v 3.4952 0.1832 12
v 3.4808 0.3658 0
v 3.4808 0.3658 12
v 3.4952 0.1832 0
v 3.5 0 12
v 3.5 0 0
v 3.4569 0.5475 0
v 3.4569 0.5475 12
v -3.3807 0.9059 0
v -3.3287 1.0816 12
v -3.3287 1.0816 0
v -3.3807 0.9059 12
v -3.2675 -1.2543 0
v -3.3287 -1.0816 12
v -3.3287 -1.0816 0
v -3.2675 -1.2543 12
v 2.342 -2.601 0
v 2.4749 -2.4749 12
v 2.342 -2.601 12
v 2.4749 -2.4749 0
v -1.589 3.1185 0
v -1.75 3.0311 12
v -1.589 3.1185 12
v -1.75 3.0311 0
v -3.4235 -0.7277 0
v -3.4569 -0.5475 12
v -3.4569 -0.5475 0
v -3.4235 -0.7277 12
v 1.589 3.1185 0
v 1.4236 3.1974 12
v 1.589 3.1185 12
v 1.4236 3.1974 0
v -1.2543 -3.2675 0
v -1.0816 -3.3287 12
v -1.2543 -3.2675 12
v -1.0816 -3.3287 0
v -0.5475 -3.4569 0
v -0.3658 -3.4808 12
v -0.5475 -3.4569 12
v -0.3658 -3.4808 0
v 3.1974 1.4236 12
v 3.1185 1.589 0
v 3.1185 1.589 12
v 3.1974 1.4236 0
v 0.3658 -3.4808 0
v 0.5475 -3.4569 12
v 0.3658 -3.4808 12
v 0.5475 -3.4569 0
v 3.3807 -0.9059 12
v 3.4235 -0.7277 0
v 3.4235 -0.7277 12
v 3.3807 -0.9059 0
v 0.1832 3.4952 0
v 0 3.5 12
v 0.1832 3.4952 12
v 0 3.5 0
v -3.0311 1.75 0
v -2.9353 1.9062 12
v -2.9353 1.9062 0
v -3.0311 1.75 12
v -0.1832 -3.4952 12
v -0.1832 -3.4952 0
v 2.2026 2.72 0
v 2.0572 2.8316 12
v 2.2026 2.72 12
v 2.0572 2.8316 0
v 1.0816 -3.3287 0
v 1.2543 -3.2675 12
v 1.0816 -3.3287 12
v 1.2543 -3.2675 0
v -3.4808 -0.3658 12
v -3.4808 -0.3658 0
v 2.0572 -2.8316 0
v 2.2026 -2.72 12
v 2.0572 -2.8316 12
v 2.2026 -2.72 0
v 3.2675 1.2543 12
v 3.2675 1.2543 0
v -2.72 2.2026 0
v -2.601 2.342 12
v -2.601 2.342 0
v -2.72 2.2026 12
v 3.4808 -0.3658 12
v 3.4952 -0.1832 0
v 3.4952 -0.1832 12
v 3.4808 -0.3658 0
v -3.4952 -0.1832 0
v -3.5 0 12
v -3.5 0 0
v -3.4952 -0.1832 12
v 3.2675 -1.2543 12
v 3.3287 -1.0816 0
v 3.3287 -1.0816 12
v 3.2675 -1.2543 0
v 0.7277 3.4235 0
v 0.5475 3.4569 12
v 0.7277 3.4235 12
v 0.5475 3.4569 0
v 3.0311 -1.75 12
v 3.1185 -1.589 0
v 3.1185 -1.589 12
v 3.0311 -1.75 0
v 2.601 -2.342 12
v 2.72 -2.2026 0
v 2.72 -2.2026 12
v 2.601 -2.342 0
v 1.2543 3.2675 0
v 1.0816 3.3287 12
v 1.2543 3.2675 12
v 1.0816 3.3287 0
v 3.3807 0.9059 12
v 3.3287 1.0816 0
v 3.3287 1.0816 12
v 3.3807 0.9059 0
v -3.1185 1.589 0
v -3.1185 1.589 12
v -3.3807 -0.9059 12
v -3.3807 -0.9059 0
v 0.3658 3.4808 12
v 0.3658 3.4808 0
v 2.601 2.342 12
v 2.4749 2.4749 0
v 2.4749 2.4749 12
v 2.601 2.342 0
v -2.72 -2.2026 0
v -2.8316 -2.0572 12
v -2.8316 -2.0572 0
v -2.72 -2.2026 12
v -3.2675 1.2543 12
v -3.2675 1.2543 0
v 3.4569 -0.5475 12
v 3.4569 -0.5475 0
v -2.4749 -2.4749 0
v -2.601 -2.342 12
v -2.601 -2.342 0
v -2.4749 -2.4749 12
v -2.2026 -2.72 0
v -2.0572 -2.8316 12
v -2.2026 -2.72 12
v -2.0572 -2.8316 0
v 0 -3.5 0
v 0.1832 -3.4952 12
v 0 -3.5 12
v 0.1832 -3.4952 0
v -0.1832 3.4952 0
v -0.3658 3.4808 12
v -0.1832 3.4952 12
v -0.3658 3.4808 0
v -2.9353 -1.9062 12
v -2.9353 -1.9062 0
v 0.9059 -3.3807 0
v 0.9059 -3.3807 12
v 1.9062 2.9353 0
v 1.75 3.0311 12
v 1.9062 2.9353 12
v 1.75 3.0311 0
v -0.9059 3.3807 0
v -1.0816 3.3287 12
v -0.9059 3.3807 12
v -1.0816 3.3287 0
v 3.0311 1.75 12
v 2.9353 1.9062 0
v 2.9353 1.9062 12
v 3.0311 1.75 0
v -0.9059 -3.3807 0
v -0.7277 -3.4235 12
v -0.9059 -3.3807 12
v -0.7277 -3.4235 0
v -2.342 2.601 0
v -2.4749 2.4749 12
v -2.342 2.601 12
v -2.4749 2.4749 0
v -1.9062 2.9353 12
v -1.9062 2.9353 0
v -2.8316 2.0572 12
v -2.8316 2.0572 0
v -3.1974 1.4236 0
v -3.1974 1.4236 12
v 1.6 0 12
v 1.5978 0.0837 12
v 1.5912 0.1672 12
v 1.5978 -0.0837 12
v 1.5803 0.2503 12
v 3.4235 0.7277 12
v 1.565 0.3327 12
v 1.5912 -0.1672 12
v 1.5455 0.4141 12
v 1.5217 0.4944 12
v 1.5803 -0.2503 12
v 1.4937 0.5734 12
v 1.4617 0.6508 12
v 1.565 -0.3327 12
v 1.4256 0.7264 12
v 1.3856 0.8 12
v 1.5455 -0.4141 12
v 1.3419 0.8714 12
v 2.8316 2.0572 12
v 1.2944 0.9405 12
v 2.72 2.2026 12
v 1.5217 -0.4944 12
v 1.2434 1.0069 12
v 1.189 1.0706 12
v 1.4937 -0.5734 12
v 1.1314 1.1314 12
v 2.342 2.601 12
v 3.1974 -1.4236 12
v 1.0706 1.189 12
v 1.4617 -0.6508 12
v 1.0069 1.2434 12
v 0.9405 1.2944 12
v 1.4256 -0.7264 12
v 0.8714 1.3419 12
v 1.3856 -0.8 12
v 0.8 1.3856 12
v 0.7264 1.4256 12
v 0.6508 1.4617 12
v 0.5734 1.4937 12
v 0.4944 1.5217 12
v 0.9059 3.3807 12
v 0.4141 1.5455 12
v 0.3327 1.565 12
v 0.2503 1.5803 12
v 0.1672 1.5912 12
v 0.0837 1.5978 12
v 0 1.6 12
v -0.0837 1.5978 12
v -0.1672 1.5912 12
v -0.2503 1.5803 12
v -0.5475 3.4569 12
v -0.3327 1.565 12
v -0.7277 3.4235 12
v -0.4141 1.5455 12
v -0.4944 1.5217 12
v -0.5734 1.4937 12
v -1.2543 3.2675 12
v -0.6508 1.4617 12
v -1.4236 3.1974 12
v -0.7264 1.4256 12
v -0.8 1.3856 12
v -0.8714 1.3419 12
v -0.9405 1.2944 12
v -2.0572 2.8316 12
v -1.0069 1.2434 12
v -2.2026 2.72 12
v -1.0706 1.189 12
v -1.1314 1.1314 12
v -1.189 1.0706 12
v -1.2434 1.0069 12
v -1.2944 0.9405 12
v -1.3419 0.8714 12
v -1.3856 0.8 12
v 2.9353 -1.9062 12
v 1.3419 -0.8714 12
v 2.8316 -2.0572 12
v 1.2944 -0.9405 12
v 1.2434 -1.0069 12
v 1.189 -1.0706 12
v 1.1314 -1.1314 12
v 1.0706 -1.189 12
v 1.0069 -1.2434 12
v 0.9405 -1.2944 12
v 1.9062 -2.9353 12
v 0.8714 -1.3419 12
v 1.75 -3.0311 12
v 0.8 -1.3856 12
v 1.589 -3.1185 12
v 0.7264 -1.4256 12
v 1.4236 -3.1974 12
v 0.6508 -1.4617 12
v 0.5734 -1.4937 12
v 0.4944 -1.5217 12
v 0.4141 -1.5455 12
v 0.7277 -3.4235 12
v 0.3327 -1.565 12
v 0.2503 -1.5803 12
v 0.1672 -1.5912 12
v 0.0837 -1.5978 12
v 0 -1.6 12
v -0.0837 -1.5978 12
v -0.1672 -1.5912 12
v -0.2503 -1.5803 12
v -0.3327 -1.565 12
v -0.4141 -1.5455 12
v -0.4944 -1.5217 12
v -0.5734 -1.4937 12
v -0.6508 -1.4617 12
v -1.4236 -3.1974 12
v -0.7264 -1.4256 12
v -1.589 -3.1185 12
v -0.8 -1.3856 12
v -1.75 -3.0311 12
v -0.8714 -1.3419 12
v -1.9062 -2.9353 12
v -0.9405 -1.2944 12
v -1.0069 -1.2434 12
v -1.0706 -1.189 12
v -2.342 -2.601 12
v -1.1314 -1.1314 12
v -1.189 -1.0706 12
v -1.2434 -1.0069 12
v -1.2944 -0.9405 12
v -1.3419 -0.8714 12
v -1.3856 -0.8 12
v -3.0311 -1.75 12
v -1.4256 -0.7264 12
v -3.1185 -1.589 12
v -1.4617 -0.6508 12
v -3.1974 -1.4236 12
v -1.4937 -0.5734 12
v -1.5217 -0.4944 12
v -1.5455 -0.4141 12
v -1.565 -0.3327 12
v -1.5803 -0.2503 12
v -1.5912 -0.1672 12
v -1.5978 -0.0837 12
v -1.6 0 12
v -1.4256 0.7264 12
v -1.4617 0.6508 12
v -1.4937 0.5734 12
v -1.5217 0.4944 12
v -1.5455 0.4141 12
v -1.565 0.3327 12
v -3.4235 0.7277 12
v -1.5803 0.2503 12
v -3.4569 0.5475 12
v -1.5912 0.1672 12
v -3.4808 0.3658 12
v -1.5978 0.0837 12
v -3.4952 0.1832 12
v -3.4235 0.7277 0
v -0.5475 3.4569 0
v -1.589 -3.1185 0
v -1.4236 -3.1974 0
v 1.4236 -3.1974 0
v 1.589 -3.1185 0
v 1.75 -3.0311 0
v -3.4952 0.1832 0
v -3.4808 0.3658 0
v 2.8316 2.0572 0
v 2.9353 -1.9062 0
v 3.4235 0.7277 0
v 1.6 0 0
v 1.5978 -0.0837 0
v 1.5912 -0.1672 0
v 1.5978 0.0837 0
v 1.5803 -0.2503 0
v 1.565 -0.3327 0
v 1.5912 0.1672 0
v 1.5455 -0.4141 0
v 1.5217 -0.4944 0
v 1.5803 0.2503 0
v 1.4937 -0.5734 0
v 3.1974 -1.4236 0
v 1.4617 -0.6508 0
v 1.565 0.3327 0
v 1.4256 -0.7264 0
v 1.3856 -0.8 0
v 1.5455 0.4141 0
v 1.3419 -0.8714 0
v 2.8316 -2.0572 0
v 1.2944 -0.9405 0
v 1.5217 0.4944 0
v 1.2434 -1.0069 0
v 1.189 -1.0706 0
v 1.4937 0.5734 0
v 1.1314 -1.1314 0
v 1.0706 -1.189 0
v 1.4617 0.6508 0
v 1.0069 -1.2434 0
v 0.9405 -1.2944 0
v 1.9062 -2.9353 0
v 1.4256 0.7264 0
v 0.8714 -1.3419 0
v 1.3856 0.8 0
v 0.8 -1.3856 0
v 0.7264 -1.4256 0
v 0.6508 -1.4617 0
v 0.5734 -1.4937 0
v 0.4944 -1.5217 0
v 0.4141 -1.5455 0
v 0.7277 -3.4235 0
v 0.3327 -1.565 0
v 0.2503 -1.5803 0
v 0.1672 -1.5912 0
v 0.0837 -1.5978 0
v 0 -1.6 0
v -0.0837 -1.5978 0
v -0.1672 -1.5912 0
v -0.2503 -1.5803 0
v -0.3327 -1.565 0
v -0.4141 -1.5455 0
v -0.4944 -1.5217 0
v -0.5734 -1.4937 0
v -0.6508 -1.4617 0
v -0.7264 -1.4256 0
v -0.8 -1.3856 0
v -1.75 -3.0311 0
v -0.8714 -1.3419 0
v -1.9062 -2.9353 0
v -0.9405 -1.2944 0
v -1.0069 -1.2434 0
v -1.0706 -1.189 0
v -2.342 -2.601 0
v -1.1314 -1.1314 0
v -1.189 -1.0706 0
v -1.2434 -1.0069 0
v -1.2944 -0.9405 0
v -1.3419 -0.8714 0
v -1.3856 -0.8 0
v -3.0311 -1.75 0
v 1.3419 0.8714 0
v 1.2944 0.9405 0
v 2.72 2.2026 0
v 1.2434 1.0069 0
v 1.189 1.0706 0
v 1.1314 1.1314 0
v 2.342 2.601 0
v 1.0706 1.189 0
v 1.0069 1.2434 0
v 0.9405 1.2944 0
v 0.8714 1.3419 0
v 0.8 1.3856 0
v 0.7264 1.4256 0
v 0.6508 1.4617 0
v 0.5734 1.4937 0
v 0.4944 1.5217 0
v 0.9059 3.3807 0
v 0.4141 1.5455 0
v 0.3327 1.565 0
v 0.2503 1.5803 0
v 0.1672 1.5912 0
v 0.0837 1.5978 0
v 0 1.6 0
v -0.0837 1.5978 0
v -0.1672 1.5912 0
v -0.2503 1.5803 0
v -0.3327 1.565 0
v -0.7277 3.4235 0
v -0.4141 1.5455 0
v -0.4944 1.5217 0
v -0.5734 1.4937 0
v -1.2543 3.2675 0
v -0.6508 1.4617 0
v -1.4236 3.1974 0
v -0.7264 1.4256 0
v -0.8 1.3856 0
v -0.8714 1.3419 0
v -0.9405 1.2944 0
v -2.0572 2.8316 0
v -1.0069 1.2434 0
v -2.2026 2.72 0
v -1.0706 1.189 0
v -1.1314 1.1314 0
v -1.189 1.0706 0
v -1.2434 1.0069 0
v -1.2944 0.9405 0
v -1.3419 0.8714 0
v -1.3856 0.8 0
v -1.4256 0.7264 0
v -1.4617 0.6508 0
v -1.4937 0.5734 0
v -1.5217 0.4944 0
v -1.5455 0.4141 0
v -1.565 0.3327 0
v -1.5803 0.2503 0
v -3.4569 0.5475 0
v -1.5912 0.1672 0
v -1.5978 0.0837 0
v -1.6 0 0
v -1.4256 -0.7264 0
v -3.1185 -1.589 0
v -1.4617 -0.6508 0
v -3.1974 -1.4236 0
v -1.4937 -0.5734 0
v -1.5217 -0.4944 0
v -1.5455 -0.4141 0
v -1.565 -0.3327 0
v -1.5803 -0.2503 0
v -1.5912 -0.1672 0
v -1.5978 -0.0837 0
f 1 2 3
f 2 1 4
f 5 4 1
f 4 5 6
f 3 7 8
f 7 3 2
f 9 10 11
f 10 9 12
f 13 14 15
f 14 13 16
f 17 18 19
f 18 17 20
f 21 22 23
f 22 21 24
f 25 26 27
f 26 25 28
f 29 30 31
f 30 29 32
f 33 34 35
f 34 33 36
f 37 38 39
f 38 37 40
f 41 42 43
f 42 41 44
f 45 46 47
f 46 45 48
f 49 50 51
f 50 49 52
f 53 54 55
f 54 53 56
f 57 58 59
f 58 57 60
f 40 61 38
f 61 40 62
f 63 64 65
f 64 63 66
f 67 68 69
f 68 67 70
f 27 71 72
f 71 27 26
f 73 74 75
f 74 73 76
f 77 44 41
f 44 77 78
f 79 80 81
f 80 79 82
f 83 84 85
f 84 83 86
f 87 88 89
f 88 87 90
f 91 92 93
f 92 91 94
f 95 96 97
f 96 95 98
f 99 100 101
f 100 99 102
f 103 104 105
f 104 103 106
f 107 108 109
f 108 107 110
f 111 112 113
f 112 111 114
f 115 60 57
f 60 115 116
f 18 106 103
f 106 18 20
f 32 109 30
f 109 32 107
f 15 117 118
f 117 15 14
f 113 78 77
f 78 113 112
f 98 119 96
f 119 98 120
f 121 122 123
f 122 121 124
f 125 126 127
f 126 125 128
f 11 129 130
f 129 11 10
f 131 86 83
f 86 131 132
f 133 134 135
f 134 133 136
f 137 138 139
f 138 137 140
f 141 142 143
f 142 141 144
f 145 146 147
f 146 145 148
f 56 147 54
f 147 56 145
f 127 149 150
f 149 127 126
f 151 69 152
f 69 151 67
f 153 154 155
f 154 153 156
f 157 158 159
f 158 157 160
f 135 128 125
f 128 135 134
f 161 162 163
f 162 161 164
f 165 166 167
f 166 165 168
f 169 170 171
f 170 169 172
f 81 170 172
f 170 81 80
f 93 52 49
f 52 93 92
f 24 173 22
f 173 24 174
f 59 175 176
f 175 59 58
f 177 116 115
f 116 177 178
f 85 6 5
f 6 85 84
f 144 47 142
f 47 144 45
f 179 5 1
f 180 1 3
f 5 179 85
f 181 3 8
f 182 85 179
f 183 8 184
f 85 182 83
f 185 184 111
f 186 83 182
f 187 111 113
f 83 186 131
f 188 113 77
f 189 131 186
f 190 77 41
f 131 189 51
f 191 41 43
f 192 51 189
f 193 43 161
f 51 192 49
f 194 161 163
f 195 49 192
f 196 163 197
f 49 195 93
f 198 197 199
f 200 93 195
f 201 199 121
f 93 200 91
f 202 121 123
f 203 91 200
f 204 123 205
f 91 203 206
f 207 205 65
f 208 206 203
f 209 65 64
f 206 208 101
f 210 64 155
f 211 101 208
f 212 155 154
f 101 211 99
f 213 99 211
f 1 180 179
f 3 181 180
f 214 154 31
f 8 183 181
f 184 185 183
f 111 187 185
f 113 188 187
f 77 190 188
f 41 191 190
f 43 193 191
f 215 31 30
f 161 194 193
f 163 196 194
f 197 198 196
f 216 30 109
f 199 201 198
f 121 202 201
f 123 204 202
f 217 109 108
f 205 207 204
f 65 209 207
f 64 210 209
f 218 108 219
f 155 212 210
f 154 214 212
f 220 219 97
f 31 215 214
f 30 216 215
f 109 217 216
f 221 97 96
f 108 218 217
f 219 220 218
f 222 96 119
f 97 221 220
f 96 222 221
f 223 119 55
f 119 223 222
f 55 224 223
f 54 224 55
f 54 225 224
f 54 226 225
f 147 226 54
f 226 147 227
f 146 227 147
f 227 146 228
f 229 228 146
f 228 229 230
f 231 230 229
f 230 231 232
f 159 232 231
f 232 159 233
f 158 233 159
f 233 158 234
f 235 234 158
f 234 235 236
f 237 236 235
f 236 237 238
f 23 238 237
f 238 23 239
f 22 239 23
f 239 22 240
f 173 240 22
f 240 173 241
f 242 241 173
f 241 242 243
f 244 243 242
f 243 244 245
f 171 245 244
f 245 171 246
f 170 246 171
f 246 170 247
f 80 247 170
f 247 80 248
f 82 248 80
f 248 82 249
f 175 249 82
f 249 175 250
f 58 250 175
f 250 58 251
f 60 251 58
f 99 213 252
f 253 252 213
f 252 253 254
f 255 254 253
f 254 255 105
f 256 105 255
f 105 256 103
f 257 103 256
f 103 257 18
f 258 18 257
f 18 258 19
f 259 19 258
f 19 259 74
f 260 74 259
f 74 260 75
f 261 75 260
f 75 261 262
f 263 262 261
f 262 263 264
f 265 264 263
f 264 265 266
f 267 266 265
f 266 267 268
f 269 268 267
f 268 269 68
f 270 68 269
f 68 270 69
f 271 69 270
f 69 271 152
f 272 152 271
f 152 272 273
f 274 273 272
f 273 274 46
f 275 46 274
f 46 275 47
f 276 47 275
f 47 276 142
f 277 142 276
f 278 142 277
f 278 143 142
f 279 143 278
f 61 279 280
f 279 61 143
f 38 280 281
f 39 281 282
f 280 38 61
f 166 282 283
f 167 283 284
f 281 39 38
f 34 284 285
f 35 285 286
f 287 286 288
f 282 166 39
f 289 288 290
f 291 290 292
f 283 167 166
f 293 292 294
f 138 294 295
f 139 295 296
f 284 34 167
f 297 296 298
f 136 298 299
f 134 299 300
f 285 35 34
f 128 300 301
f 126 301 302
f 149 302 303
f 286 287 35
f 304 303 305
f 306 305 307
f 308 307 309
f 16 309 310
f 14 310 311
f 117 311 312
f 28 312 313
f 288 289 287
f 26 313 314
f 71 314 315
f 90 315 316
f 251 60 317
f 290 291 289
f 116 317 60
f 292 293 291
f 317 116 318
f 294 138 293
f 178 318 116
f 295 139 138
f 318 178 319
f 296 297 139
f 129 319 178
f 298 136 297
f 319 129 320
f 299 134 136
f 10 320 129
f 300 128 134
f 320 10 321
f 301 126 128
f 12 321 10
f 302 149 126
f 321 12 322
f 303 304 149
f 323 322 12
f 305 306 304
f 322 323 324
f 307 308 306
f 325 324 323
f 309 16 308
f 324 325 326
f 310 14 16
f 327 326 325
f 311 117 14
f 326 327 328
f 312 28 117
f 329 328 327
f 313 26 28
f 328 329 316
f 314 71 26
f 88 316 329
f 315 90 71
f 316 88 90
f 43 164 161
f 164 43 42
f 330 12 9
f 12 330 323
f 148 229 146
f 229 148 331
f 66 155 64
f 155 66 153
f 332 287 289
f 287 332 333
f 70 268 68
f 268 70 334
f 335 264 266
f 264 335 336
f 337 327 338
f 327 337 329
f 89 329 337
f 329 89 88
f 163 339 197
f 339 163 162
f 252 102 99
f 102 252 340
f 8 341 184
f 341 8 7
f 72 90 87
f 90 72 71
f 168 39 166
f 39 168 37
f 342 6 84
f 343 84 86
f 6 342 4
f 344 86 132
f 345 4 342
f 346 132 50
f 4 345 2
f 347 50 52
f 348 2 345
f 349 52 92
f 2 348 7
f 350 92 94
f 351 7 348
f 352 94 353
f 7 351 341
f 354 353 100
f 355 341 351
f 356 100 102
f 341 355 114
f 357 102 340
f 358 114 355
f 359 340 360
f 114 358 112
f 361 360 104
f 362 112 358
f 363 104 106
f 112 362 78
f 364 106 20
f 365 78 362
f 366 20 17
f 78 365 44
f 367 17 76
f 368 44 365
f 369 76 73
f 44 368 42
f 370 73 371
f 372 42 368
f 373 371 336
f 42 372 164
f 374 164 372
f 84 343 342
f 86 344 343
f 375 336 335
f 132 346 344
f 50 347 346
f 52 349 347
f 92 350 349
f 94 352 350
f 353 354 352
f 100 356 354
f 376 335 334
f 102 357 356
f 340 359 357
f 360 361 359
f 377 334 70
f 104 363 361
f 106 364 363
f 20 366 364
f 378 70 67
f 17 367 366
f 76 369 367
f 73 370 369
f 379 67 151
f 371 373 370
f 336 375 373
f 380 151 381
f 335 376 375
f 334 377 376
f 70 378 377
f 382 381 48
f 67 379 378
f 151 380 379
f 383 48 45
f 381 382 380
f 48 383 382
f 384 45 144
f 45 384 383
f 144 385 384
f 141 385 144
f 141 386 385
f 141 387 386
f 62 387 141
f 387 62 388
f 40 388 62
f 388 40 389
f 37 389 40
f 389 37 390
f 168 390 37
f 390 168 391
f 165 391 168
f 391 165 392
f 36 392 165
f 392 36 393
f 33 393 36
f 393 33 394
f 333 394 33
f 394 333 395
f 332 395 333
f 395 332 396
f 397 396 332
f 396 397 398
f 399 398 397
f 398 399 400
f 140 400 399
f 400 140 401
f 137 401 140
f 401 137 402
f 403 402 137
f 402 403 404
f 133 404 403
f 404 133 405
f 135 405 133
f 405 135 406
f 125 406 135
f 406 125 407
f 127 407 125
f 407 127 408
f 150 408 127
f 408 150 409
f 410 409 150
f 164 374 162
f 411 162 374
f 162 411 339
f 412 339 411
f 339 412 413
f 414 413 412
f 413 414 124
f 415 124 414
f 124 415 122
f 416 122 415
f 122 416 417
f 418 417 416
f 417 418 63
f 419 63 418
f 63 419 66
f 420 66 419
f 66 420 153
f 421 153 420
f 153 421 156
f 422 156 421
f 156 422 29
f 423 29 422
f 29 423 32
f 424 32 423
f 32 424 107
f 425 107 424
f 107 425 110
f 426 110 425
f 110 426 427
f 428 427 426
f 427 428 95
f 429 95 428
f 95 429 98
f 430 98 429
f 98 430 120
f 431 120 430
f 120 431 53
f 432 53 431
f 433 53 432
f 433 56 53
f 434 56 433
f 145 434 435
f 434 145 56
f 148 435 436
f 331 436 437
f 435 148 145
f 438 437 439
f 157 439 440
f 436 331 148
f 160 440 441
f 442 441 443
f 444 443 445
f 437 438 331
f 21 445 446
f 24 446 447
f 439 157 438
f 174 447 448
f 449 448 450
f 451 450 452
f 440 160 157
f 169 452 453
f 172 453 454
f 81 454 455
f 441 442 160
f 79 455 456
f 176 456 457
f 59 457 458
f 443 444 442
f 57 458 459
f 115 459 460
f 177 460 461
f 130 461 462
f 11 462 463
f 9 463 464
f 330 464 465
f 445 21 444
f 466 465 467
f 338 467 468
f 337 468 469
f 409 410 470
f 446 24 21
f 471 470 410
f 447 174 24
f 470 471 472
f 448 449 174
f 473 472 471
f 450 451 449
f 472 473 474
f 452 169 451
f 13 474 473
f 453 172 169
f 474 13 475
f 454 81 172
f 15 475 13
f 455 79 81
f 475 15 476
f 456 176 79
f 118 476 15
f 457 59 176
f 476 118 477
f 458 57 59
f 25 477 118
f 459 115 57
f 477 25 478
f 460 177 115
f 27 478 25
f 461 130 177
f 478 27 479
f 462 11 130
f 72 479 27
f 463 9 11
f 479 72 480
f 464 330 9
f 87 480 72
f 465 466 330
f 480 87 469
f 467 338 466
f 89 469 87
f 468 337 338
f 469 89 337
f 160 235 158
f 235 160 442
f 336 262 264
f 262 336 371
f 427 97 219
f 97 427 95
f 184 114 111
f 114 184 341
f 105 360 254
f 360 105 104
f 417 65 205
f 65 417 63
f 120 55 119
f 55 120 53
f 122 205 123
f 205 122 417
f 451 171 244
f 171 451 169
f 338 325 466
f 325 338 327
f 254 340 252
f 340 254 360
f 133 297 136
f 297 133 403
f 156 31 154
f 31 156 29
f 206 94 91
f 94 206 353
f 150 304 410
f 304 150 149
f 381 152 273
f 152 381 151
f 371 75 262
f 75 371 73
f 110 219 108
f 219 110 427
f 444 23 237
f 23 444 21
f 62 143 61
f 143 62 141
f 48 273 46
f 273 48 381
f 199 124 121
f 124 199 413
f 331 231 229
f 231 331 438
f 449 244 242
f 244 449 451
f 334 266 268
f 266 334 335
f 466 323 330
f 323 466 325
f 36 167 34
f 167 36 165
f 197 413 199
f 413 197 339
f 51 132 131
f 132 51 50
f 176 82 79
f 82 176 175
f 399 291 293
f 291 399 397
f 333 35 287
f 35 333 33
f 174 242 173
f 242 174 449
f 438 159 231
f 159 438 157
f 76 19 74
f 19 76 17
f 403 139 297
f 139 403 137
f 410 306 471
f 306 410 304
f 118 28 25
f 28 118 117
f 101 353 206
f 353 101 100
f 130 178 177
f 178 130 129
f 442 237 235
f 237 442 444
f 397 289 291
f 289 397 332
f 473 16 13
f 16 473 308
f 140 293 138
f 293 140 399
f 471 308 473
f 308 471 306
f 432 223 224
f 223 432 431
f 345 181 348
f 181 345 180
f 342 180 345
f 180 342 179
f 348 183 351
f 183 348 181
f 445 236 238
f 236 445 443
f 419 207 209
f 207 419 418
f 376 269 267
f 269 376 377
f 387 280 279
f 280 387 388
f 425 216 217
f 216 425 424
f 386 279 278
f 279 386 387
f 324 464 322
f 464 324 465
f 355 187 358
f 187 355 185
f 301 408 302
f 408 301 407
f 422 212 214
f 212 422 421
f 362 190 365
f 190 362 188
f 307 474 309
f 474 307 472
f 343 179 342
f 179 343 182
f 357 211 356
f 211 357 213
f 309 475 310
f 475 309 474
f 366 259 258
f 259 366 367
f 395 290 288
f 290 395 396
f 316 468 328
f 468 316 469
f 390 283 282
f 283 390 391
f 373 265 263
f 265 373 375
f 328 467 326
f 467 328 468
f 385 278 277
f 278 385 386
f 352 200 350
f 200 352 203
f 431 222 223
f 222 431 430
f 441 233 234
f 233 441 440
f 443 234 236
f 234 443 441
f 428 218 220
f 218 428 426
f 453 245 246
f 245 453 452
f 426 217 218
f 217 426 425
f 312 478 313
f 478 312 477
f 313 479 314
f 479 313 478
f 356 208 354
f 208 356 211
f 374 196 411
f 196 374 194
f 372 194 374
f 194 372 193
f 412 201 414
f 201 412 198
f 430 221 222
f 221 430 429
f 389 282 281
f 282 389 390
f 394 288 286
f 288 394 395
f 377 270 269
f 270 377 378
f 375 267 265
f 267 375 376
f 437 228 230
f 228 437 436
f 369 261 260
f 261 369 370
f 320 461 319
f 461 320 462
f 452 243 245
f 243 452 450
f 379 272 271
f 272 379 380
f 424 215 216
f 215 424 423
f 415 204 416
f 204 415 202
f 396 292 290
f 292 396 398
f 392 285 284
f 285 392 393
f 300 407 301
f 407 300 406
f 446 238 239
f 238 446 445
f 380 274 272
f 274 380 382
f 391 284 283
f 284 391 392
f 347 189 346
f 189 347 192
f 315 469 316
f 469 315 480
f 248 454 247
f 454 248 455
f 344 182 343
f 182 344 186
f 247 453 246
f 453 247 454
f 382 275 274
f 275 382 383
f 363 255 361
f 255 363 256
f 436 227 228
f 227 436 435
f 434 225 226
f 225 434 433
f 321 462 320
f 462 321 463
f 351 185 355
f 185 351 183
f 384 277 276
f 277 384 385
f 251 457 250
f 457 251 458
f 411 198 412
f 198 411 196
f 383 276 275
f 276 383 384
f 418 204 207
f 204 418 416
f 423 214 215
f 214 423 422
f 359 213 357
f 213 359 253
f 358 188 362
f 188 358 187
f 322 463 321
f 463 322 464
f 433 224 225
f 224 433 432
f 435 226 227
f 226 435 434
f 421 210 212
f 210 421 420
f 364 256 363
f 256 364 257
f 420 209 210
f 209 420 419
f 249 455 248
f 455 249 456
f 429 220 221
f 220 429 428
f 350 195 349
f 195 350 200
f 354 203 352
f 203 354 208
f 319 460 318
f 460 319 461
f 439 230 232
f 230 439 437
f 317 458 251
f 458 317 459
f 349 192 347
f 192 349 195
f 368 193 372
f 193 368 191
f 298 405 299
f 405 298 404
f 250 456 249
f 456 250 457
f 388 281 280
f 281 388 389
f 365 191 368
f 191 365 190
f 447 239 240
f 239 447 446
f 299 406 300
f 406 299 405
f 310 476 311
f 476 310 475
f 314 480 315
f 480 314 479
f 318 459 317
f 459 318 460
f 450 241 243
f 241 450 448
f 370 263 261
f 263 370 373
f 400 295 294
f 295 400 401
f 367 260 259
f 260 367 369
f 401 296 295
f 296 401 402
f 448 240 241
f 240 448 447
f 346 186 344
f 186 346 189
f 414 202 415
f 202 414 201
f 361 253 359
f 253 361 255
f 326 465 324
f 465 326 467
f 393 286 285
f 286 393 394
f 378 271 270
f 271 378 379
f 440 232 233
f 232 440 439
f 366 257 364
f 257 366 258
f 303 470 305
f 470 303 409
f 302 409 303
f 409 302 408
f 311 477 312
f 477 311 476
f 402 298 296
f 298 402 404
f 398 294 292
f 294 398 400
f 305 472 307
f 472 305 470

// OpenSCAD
// file: compact_helpers.scad
// Reusable native geometry helpers.
function polar(r,a)=[r*cos(a),r*sin(a)];
function rotate_point(p,a)=[p[0]*cos(a)-p[1]*sin(a),p[0]*sin(a)+p[1]*cos(a)];
function profile_point(t)=let(
    s=sqrt(pow(pitch_radius,2)-pow(eccentricity*sin(cavity_count*t),2)),
    r=eccentricity*cos(cavity_count*t)+s,
    xi=atan2(eccentricity*cavity_count*sin(cavity_count*t),s),
    rr=roller_radius+profile_clearance)
    [r*cos(t)+rr*cos(t+xi),r*sin(t)+rr*sin(t+xi)];
function profile_points(upper=false)=[for(i=[0:cavity_count*profile_samples_per_cavity-1])
    rotate_point(profile_point(360*i/(cavity_count*profile_samples_per_cavity)),0)];
function roller_position(i,a,upper=false)=let(
    t=-a/roller_count+360*i/roller_count,
    rel=t-a-(upper?180:0),
    r=eccentricity*cos(rel)+sqrt(pow(pitch_radius,2)-pow(eccentricity*sin(rel),2))) polar(r,t);
module tube(ro,ri,h) { difference() { cylinder(r=ro,h=h); translate([0,0,-eps]) cylinder(r=ri,h=h+2*eps); } }
module screw_hole(size,h) { scale([1,1,h]) { if(size=="m2") oobb_hole_m2(); if(size=="m3") oobb_hole_m3(); if(size=="m6") oobb_hole_m6(); } }
module socket_recess(size,depth) {
    // OOBB socket head starts at the under-head plane and extends outward.
    scale([1,1,depth/(size=="m3"?3.2:2.2)]) {
        if(size=="m3") oobb_socket_m3(); else oobb_socket_m2();
    }
}
module at_mounts(points) { for(p=points) translate([p[0],p[1],0]) children(); }
module shaft_cut(h,fit=shaft_fit_clearance) {
    linear_extrude(h) intersection() {
        circle(r=input_shaft_diameter/2+fit);
        translate([-10,-10]) square([10+input_shaft_diameter/2-input_shaft_flat_depth+fit,20]);
    }
}
module rounded_rectangle_plate(size=[119,119,3],radius=1.5) {
    hull() for(x=[-1,1],y=[-1,1]) translate([x*(size[0]/2-radius),y*(size[1]/2-radius),0]) cylinder(r=radius,h=size[2]);
}
module grid_cuts(h) {
    // Actual OOBB grid centres: six units are centred on half-pitch offsets.
    for(i=[0:base_width-1],j=[0:base_height-1])
        let(x=(i-(base_width-1)/2)*oobb_grid_pitch,y=(j-(base_height-1)/2)*oobb_grid_pitch)
        if(sqrt(x*x+y*y)>housing_radius+3.5)
            translate([x,y,-eps]) screw_hole("m6",h+2*eps);
}
module wave_generator() {
    render(convexity=20) difference() {
        tube(wave_radius,12.6,wave_height);
        translate([0,0,wave_seat_z]) cylinder(r=13.5+bearing_seat_clearance,h=wave_height);
        translate([0,0,wave_height-wave_cap_depth]) cylinder(r=22.15,h=wave_cap_depth+eps);
        at_mounts(wave_mounts) {
            translate([0,0,-eps]) screw_hole("m3",wave_height+2*eps);
            translate([0,0,wave_nut_z]) scale([1,1,(wave_height-wave_cap_depth-wave_nut_z+eps)/2.7]) oobb_nut_m3();
        }
    }
}
module wave_cap() {
    render(convexity=20) difference() {
        tube(22,12.6,wave_cap_depth);
        at_mounts(wave_mounts) {
            translate([0,0,-eps]) screw_hole("m3",wave_cap_depth+2*eps);
            translate([0,0,wave_cap_depth-wave_head_recess]) socket_recess("m3",wave_head_recess+eps);
        }
    }
}
// file: oobb_hardware.scad
module oobb_rounded_rectangle_edges(size, radius, radius_top, radius_bottom) {
      rt=radius_top; rb=radius_bottom; depth=size[2]; n=16;
      lower=rb==0 ? [[radius,0]] :
        [for(i=[0:n]) let(a=-90+90*i/n) [radius-rb+rb*cos(a),rb+rb*sin(a)]];
      upper=rt==0 ? [[radius,depth]] :
        [for(i=[0:n]) let(a=90*i/n) [radius-rt+rt*cos(a),depth-rt+rt*sin(a)]];
      hull() for(x=[-size[0]/2+radius,size[0]/2-radius])
        for(y=[-size[1]/2+radius,size[1]/2-radius])
          translate([x,y,0]) rotate_extrude()
            polygon(concat([[0,0]],lower,upper,[[0,depth]]));
    }
// Generated from installed OOBB v5. All primitives use overhang=True.

module oobb_motor_plate_body() {


difference() {
	union() {
		translate(v = [0, 0, 0]) {
			rotate(a = [0, 0, 0]) {
				difference() {
					union() {
						oobb_rounded_rectangle_edges(radius = 1.5, radius_bottom = 1.5, radius_top = 1.5, size = [89.0, 89.0, 4.0]);
					}
					union();
				}
			}
		}
	}
	union();
}

}

module oobb_hole_m2() {


difference() {
	union() {
		cylinder(h = 1, r = 1.35);
	}
	union();
}

}

module oobb_hole_m3() {


difference() {
	union() {
		cylinder(h = 1, r = 1.8);
	}
	union();
}

}

module oobb_hole_m6() {


difference() {
	union() {
		cylinder(h = 1, r = 3.25);
	}
	union();
}

}

module oobb_nut_m2() {


difference() {
	union() {
		translate(v = [0, 0, 0]) {
			rotate(a = [0, 0, 0]) {
				difference() {
					union() {
						linear_extrude(height = 2.2) {
							polygon(points = [[2.4234, 0.0], [1.2117000000000002, 2.0987259635312085], [-1.2116999999999996, 2.0987259635312085], [-2.4234, 2.967809053053696e-16], [-1.211700000000001, -2.098725963531208], [1.2116999999999984, -2.0987259635312094]]);
						}
						translate(v = [-1.25, -2.75, -0.3]) {
							cube(size = [2.5, 5.5, 0.3]);
						}
						translate(v = [-1.25, -1.25, -0.6]) {
							cube(size = [2.5, 2.5, 0.3]);
						}
						translate(v = [-1.25, -2.75, 2.2]) {
							cube(size = [2.5, 5.5, 0.3]);
						}
						translate(v = [-1.25, -1.25, 2.5]) {
							cube(size = [2.5, 2.5, 0.3]);
						}
					}
					union();
				}
			}
		}
	}
	union();
}

}

module oobb_socket_m2() {


difference() {
	union() {
		translate(v = [0, 0, 0]) {
			rotate(a = [0, 0, 0]) {
				difference() {
					union() {
						cylinder(h = 2.2, r = 2.1);
						translate(v = [-1.25, -2.75, -0.3]) {
							cube(size = [2.5, 5.5, 0.3]);
						}
						translate(v = [-1.25, -1.25, -0.6]) {
							cube(size = [2.5, 2.5, 0.3]);
						}
					}
					union();
				}
			}
		}
	}
	union();
}

}

module oobb_nut_m3() {


difference() {
	union() {
		translate(v = [0, 0, 0]) {
			rotate(a = [0, 0, 0]) {
				difference() {
					union() {
						linear_extrude(height = 2.7) {
							polygon(points = [[3.4619999999999997, 0.0], [1.7310000000000003, 2.9981799479017264], [-1.7309999999999992, 2.9981799479017264], [-3.4619999999999997, 4.2397272186481365e-16], [-1.7310000000000014, -2.998179947901726], [1.7309999999999977, -2.9981799479017277]]);
						}
						translate(v = [-1.75, -3.25, -0.3]) {
							cube(size = [3.5, 6.5, 0.3]);
						}
						translate(v = [-1.75, -1.75, -0.6]) {
							cube(size = [3.5, 3.5, 0.3]);
						}
						translate(v = [-1.75, -3.25, 2.7]) {
							cube(size = [3.5, 6.5, 0.3]);
						}
						translate(v = [-1.75, -1.75, 3.0]) {
							cube(size = [3.5, 3.5, 0.3]);
						}
					}
					union();
				}
			}
		}
	}
	union();
}

}

module oobb_socket_m3() {


difference() {
	union() {
		translate(v = [0, 0, 0]) {
			rotate(a = [0, 0, 0]) {
				difference() {
					union() {
						cylinder(h = 3.2, r = 3.0);
						translate(v = [-1.75, -3.25, -0.3]) {
							cube(size = [3.5, 6.5, 0.3]);
						}
						translate(v = [-1.75, -1.75, -0.6]) {
							cube(size = [3.5, 3.5, 0.3]);
						}
					}
					union();
				}
			}
		}
	}
	union();
}

}

module oobb_nut_m6() {


difference() {
	union() {
		translate(v = [0, 0, 0]) {
			rotate(a = [0, 0, 0]) {
				difference() {
					union() {
						linear_extrude(height = 5.2) {
							polygon(points = [[5.914249999999999, 0.0], [2.957125, 5.1218907443321156], [-2.9571249999999982, 5.1218907443321156], [-5.914249999999999, 7.242867331857232e-16], [-2.9571250000000022, -5.121890744332115], [2.9571249999999956, -5.121890744332118]]);
						}
						translate(v = [-2.875, -5.0, -0.3]) {
							cube(size = [5.75, 10, 0.3]);
						}
						translate(v = [-2.875, -2.875, -0.6]) {
							cube(size = [5.75, 5.75, 0.3]);
						}
						translate(v = [-2.875, -5.0, 5.2]) {
							cube(size = [5.75, 10, 0.3]);
						}
						translate(v = [-2.875, -2.875, 5.5]) {
							cube(size = [5.75, 5.75, 0.3]);
						}
					}
					union();
				}
			}
		}
	}
	union();
}

}
// file: parameters.scad
// Generated by working_scad.py. Edit the Python recipe to persist changes.
style = "version_5";
reduction = 12;
bearing_output = "6810";
bearing_wave = "6704";
roller_diameter = 7.0;
roller_bore_diameter = 3.2;
roller_length = 12.0;
roller_material = "nylon";
roller_bank_count = 1;
motor_plate_depth = 4.0;
motor_body_depth = 40.0;
motor_shaft_length = 24.0;
motor_hole_pitch = 31.0;
motor_thread_depth = 6.0;
motor_pilot_diameter = 22.0;
motor_pilot_height = 2.0;
output_holder_wall = 7.0;
max_screw_length = 35.0;
eccentricity = 0.75;
wave_radius = 23.25;
profile_clearance = 0.15;
roller_slot_clearance = 0.3;
roller_end_clearance = 0.3;
cage_wall = 4.0;
cage_plate_depth = 3.0;
bearing_seat_clearance = 0.1;
journal_clearance = 0.05;
bearing_axial_clearance = 0.2;
output_plate_diameter = 65.0;
output_plate_depth = 6.0;
output_grid_pitch = 15.0;
output_face_clearance = 0.3;
output_socket_recess = 4.0;
output_screw_length = 16;
output_nut_depth = 5.2;
output_nut_height = 5.0;
motor_shaft_end_clearance = 0.5;
base_width = 6;
base_height = 6;
oobb_grid_pitch = 15.0;
oobb_size_allowance = 1.0;
base_edge_radius = 1.5;
housing_flange_corner_radius = 1.5;
housing_screw_pitch_radius = 35.5;
housing_screw_count = 6;
input_shaft_diameter = 5.0;
input_shaft_flat_depth = 0.5;
shaft_fit_clearance = 0.1;
cage_screw_count = 4;
profile_samples_per_cavity = 100;
circle_fragments = 120;
overhang = true;
run_scad = true;
run_solidcraft = false;
generate_stl = true;
generate_previews = true;
generate_renders = true;
validate_geometry = true;
package_outputs = true;
render_threads = 8;
variant = "default";
// main file
include <parameters.scad>;
use <oobb_hardware.scad>;
include <geometry.scad>;
roller();
